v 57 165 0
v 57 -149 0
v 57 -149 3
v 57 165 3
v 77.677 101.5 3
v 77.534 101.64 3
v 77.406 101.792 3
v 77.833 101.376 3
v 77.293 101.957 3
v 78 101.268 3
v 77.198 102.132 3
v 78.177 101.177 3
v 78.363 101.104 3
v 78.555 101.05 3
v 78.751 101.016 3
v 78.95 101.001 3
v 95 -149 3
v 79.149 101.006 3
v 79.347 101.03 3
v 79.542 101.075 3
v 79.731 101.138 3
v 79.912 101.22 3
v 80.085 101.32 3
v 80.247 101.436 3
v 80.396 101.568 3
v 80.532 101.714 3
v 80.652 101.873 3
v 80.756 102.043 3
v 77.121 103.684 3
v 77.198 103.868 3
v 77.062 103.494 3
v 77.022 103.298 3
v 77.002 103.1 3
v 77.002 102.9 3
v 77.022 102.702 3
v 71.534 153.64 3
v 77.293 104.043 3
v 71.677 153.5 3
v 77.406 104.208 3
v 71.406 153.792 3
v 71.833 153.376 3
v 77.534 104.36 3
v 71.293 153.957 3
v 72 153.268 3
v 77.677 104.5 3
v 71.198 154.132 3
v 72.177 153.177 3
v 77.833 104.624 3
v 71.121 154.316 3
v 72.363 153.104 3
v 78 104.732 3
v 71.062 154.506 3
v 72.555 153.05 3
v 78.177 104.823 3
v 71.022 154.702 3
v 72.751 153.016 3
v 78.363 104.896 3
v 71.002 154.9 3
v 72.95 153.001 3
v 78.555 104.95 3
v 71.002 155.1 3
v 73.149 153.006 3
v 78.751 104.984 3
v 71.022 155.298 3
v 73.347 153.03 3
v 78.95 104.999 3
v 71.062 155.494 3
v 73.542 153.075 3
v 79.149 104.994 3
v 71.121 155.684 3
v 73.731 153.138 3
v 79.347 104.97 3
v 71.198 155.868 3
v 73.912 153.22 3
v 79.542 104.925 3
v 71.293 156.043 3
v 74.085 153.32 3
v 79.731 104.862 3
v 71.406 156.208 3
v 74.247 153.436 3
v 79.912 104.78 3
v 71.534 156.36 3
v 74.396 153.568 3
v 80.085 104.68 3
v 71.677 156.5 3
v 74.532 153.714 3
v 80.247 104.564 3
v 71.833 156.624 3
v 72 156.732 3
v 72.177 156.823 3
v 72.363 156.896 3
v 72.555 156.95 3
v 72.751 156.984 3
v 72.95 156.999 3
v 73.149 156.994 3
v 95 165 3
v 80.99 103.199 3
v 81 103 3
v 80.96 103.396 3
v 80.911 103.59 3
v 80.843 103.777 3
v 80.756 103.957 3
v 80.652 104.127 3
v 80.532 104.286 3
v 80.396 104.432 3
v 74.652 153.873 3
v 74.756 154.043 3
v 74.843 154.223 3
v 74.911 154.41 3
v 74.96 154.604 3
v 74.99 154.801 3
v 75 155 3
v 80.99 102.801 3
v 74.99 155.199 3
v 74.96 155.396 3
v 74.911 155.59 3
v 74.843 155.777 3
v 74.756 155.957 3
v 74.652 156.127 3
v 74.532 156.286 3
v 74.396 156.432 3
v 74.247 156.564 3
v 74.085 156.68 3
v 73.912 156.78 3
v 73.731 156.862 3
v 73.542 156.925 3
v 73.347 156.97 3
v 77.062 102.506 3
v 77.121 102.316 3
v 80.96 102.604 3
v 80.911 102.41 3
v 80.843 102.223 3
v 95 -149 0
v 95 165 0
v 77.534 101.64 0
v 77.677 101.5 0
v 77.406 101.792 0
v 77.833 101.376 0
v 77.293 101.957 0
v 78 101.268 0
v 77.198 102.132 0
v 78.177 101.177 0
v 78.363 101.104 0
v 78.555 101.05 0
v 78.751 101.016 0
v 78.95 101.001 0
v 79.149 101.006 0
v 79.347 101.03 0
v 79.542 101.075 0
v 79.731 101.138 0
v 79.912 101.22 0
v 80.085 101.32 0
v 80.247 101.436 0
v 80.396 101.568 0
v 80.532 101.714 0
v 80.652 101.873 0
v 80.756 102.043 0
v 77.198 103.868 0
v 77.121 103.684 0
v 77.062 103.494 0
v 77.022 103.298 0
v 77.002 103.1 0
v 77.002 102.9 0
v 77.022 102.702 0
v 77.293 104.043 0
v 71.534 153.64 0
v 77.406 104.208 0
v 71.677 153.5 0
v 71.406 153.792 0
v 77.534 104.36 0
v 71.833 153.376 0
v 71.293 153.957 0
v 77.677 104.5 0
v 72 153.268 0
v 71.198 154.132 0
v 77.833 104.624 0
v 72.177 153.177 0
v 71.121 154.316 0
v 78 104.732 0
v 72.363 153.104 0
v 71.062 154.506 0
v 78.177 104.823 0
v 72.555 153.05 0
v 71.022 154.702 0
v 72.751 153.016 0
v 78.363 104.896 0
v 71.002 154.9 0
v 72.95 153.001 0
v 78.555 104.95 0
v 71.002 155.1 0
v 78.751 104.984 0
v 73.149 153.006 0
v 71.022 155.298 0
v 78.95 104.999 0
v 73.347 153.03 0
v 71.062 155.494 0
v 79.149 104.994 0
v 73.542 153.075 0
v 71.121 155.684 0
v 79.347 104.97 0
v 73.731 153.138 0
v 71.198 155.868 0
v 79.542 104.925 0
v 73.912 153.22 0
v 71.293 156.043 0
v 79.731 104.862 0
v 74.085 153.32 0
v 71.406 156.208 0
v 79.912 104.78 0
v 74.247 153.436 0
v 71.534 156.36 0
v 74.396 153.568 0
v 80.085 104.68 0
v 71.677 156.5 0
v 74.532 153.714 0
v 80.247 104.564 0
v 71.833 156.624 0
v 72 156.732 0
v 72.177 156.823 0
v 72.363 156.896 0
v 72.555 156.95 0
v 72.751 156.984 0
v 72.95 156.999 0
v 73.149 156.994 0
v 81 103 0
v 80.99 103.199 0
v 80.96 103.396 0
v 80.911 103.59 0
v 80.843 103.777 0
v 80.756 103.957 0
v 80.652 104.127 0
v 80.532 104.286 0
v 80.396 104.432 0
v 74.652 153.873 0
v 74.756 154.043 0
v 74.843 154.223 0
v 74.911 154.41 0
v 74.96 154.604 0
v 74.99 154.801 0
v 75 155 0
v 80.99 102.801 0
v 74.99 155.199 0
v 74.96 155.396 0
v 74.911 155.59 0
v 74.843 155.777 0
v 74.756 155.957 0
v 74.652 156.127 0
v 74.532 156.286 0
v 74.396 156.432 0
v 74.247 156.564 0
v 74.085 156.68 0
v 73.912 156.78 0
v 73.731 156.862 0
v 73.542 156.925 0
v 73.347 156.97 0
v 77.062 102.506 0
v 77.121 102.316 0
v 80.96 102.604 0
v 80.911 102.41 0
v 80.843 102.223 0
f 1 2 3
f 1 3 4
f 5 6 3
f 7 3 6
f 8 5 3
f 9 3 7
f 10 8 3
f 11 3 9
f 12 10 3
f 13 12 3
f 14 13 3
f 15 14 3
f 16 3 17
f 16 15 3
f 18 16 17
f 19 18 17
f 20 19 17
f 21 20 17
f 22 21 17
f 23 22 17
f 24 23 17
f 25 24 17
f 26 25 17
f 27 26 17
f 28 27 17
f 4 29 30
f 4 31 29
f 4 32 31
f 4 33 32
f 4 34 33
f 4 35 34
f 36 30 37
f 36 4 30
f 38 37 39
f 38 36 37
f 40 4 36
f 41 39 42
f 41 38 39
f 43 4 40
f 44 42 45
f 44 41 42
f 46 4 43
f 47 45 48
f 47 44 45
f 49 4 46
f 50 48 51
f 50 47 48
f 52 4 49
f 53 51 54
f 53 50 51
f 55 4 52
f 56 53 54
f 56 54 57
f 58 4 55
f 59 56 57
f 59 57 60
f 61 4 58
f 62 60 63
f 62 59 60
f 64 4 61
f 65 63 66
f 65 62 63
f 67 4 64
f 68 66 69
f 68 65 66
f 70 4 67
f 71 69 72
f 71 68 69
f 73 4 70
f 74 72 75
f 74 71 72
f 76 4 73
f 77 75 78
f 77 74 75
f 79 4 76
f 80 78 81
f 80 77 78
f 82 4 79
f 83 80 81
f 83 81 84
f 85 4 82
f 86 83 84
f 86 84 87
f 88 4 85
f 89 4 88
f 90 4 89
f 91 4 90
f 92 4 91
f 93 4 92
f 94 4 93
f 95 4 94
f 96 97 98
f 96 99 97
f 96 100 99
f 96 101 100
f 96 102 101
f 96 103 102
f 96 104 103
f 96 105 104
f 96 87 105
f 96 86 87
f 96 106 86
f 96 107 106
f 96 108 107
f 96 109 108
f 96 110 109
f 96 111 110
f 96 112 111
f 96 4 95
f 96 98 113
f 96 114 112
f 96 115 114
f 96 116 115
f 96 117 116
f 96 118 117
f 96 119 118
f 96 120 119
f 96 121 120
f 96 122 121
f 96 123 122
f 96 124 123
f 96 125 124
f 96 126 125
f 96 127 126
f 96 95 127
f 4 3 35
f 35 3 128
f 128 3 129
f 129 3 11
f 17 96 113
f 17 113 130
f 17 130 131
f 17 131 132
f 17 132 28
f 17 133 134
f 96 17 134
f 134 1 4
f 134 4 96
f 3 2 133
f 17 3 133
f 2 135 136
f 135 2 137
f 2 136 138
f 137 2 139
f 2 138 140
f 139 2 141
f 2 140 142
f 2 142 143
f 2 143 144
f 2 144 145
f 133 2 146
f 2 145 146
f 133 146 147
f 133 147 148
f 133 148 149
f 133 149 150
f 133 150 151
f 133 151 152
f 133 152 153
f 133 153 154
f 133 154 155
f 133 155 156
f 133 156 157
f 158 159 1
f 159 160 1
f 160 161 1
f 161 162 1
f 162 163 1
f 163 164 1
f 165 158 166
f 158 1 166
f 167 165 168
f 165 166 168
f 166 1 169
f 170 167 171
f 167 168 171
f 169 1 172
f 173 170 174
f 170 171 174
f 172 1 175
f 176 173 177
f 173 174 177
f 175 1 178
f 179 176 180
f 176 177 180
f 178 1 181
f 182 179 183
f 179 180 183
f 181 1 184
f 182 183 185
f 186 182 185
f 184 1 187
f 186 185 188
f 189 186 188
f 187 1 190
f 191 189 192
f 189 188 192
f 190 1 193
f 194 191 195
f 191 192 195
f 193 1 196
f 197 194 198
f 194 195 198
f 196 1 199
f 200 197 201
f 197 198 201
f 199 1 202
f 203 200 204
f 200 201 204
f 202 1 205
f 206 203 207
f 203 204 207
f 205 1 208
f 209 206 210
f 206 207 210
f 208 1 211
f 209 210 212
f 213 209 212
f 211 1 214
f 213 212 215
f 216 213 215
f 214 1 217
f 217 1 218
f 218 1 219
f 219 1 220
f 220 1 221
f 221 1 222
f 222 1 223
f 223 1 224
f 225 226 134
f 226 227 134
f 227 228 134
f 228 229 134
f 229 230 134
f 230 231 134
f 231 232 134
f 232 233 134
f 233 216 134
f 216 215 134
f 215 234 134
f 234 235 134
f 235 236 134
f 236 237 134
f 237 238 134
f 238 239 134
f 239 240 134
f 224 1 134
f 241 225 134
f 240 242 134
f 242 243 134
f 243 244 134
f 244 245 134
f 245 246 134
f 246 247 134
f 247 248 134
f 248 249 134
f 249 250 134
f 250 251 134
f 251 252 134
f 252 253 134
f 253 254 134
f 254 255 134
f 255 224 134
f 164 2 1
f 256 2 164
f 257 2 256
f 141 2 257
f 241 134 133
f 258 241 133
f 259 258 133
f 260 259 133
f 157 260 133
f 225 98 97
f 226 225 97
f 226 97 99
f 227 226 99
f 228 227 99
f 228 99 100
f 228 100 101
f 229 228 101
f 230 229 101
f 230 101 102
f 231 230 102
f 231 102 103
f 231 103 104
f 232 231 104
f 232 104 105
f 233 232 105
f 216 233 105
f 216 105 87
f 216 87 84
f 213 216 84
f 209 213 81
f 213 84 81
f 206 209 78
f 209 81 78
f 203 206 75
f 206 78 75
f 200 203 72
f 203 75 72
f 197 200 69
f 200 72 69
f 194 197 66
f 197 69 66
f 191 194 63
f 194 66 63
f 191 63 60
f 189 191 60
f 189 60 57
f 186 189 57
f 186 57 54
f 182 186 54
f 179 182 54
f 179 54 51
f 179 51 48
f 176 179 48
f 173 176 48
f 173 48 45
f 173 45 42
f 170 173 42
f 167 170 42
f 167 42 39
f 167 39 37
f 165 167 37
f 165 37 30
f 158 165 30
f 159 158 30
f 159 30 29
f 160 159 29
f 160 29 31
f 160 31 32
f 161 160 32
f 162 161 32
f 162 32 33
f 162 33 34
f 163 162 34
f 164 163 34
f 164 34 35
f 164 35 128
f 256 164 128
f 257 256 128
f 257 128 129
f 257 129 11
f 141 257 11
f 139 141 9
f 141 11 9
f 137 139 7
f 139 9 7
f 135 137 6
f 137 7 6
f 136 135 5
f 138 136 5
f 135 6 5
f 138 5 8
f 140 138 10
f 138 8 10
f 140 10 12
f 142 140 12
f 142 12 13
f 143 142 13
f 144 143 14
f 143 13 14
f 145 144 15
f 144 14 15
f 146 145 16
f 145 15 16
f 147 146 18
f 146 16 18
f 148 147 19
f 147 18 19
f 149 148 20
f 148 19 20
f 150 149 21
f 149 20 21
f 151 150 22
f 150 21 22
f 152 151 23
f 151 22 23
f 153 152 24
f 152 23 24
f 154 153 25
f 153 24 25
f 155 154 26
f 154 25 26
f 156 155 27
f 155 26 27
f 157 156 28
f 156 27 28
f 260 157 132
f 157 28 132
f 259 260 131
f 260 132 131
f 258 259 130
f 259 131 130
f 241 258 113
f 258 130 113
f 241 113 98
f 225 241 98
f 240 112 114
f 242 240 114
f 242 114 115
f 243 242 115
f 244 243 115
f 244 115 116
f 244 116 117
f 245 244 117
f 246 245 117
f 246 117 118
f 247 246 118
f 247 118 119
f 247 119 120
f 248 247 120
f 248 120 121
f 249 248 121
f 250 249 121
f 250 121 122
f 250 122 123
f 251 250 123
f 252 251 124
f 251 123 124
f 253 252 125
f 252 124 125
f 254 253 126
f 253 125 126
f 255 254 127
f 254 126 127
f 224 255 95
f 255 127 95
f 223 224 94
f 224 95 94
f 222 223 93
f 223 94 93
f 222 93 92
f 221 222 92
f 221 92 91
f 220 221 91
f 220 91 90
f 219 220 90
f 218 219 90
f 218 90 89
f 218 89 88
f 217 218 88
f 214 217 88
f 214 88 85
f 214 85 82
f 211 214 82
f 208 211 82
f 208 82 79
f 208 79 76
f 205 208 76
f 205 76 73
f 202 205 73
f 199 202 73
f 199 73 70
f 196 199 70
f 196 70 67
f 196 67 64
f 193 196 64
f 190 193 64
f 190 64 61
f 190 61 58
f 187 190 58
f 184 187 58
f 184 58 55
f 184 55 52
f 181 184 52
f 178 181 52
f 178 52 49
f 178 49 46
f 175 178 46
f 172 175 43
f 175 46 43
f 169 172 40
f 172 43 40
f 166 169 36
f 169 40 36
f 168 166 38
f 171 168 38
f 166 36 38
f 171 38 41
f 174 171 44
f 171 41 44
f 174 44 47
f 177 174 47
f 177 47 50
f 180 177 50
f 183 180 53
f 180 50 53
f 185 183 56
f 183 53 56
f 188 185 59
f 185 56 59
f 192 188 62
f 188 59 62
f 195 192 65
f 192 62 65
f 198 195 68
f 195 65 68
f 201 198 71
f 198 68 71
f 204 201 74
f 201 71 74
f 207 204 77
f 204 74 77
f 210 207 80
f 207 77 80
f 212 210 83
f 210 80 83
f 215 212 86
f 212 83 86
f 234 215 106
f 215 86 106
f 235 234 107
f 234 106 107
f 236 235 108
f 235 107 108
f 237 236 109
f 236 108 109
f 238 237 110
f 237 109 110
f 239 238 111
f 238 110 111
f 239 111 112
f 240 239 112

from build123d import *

# Parameters (mm, degrees)
ESQUISSE1_W             = 38
ESQUISSE1_H             = 314
BOSS_EXTRU_1_DEPTH      = 3
ENL_V_MAT_EXTRU_1_REACH = 192.418
ESQUISSE2_R             = 2


with BuildPart() as part:
    # Esquisse1 → Boss.-Extru.1 (new body)
    with BuildSketch(Plane.XY):
        with Locations((76, 8)):
            Rectangle(ESQUISSE1_W, ESQUISSE1_H)
    extrude(amount=BOSS_EXTRU_1_DEPTH)

    # Esquisse2 → Enlèv. mat.-Extru.1 (cut, up to next)
    with BuildSketch(Plane.XY.offset(3), mode=Mode.PRIVATE) as enl_v_mat_extru_1_sk1:
        with Locations((73, 155)):
            Circle(ESQUISSE2_R)
    enl_v_mat_extru_1_tool1 = extrude(enl_v_mat_extru_1_sk1.sketch, amount=-ENL_V_MAT_EXTRU_1_REACH, mode=Mode.PRIVATE) & part.part
    # Esquisse2 → Enlèv. mat.-Extru.1 (cut, up to next)
    with BuildSketch(Plane.XY.offset(3), mode=Mode.PRIVATE) as enl_v_mat_extru_1_sk2:
        with Locations((79, 103)):
            Circle(ESQUISSE2_R)
    enl_v_mat_extru_1_tool2 = extrude(enl_v_mat_extru_1_sk2.sketch, amount=-ENL_V_MAT_EXTRU_1_REACH, mode=Mode.PRIVATE) & part.part
    add(enl_v_mat_extru_1_tool1.solids().sort_by_distance((73, 155, 3))[0], mode=Mode.SUBTRACT)
    add(enl_v_mat_extru_1_tool2.solids().sort_by_distance((79, 103, 3))[0], mode=Mode.SUBTRACT)


solid = part.part
